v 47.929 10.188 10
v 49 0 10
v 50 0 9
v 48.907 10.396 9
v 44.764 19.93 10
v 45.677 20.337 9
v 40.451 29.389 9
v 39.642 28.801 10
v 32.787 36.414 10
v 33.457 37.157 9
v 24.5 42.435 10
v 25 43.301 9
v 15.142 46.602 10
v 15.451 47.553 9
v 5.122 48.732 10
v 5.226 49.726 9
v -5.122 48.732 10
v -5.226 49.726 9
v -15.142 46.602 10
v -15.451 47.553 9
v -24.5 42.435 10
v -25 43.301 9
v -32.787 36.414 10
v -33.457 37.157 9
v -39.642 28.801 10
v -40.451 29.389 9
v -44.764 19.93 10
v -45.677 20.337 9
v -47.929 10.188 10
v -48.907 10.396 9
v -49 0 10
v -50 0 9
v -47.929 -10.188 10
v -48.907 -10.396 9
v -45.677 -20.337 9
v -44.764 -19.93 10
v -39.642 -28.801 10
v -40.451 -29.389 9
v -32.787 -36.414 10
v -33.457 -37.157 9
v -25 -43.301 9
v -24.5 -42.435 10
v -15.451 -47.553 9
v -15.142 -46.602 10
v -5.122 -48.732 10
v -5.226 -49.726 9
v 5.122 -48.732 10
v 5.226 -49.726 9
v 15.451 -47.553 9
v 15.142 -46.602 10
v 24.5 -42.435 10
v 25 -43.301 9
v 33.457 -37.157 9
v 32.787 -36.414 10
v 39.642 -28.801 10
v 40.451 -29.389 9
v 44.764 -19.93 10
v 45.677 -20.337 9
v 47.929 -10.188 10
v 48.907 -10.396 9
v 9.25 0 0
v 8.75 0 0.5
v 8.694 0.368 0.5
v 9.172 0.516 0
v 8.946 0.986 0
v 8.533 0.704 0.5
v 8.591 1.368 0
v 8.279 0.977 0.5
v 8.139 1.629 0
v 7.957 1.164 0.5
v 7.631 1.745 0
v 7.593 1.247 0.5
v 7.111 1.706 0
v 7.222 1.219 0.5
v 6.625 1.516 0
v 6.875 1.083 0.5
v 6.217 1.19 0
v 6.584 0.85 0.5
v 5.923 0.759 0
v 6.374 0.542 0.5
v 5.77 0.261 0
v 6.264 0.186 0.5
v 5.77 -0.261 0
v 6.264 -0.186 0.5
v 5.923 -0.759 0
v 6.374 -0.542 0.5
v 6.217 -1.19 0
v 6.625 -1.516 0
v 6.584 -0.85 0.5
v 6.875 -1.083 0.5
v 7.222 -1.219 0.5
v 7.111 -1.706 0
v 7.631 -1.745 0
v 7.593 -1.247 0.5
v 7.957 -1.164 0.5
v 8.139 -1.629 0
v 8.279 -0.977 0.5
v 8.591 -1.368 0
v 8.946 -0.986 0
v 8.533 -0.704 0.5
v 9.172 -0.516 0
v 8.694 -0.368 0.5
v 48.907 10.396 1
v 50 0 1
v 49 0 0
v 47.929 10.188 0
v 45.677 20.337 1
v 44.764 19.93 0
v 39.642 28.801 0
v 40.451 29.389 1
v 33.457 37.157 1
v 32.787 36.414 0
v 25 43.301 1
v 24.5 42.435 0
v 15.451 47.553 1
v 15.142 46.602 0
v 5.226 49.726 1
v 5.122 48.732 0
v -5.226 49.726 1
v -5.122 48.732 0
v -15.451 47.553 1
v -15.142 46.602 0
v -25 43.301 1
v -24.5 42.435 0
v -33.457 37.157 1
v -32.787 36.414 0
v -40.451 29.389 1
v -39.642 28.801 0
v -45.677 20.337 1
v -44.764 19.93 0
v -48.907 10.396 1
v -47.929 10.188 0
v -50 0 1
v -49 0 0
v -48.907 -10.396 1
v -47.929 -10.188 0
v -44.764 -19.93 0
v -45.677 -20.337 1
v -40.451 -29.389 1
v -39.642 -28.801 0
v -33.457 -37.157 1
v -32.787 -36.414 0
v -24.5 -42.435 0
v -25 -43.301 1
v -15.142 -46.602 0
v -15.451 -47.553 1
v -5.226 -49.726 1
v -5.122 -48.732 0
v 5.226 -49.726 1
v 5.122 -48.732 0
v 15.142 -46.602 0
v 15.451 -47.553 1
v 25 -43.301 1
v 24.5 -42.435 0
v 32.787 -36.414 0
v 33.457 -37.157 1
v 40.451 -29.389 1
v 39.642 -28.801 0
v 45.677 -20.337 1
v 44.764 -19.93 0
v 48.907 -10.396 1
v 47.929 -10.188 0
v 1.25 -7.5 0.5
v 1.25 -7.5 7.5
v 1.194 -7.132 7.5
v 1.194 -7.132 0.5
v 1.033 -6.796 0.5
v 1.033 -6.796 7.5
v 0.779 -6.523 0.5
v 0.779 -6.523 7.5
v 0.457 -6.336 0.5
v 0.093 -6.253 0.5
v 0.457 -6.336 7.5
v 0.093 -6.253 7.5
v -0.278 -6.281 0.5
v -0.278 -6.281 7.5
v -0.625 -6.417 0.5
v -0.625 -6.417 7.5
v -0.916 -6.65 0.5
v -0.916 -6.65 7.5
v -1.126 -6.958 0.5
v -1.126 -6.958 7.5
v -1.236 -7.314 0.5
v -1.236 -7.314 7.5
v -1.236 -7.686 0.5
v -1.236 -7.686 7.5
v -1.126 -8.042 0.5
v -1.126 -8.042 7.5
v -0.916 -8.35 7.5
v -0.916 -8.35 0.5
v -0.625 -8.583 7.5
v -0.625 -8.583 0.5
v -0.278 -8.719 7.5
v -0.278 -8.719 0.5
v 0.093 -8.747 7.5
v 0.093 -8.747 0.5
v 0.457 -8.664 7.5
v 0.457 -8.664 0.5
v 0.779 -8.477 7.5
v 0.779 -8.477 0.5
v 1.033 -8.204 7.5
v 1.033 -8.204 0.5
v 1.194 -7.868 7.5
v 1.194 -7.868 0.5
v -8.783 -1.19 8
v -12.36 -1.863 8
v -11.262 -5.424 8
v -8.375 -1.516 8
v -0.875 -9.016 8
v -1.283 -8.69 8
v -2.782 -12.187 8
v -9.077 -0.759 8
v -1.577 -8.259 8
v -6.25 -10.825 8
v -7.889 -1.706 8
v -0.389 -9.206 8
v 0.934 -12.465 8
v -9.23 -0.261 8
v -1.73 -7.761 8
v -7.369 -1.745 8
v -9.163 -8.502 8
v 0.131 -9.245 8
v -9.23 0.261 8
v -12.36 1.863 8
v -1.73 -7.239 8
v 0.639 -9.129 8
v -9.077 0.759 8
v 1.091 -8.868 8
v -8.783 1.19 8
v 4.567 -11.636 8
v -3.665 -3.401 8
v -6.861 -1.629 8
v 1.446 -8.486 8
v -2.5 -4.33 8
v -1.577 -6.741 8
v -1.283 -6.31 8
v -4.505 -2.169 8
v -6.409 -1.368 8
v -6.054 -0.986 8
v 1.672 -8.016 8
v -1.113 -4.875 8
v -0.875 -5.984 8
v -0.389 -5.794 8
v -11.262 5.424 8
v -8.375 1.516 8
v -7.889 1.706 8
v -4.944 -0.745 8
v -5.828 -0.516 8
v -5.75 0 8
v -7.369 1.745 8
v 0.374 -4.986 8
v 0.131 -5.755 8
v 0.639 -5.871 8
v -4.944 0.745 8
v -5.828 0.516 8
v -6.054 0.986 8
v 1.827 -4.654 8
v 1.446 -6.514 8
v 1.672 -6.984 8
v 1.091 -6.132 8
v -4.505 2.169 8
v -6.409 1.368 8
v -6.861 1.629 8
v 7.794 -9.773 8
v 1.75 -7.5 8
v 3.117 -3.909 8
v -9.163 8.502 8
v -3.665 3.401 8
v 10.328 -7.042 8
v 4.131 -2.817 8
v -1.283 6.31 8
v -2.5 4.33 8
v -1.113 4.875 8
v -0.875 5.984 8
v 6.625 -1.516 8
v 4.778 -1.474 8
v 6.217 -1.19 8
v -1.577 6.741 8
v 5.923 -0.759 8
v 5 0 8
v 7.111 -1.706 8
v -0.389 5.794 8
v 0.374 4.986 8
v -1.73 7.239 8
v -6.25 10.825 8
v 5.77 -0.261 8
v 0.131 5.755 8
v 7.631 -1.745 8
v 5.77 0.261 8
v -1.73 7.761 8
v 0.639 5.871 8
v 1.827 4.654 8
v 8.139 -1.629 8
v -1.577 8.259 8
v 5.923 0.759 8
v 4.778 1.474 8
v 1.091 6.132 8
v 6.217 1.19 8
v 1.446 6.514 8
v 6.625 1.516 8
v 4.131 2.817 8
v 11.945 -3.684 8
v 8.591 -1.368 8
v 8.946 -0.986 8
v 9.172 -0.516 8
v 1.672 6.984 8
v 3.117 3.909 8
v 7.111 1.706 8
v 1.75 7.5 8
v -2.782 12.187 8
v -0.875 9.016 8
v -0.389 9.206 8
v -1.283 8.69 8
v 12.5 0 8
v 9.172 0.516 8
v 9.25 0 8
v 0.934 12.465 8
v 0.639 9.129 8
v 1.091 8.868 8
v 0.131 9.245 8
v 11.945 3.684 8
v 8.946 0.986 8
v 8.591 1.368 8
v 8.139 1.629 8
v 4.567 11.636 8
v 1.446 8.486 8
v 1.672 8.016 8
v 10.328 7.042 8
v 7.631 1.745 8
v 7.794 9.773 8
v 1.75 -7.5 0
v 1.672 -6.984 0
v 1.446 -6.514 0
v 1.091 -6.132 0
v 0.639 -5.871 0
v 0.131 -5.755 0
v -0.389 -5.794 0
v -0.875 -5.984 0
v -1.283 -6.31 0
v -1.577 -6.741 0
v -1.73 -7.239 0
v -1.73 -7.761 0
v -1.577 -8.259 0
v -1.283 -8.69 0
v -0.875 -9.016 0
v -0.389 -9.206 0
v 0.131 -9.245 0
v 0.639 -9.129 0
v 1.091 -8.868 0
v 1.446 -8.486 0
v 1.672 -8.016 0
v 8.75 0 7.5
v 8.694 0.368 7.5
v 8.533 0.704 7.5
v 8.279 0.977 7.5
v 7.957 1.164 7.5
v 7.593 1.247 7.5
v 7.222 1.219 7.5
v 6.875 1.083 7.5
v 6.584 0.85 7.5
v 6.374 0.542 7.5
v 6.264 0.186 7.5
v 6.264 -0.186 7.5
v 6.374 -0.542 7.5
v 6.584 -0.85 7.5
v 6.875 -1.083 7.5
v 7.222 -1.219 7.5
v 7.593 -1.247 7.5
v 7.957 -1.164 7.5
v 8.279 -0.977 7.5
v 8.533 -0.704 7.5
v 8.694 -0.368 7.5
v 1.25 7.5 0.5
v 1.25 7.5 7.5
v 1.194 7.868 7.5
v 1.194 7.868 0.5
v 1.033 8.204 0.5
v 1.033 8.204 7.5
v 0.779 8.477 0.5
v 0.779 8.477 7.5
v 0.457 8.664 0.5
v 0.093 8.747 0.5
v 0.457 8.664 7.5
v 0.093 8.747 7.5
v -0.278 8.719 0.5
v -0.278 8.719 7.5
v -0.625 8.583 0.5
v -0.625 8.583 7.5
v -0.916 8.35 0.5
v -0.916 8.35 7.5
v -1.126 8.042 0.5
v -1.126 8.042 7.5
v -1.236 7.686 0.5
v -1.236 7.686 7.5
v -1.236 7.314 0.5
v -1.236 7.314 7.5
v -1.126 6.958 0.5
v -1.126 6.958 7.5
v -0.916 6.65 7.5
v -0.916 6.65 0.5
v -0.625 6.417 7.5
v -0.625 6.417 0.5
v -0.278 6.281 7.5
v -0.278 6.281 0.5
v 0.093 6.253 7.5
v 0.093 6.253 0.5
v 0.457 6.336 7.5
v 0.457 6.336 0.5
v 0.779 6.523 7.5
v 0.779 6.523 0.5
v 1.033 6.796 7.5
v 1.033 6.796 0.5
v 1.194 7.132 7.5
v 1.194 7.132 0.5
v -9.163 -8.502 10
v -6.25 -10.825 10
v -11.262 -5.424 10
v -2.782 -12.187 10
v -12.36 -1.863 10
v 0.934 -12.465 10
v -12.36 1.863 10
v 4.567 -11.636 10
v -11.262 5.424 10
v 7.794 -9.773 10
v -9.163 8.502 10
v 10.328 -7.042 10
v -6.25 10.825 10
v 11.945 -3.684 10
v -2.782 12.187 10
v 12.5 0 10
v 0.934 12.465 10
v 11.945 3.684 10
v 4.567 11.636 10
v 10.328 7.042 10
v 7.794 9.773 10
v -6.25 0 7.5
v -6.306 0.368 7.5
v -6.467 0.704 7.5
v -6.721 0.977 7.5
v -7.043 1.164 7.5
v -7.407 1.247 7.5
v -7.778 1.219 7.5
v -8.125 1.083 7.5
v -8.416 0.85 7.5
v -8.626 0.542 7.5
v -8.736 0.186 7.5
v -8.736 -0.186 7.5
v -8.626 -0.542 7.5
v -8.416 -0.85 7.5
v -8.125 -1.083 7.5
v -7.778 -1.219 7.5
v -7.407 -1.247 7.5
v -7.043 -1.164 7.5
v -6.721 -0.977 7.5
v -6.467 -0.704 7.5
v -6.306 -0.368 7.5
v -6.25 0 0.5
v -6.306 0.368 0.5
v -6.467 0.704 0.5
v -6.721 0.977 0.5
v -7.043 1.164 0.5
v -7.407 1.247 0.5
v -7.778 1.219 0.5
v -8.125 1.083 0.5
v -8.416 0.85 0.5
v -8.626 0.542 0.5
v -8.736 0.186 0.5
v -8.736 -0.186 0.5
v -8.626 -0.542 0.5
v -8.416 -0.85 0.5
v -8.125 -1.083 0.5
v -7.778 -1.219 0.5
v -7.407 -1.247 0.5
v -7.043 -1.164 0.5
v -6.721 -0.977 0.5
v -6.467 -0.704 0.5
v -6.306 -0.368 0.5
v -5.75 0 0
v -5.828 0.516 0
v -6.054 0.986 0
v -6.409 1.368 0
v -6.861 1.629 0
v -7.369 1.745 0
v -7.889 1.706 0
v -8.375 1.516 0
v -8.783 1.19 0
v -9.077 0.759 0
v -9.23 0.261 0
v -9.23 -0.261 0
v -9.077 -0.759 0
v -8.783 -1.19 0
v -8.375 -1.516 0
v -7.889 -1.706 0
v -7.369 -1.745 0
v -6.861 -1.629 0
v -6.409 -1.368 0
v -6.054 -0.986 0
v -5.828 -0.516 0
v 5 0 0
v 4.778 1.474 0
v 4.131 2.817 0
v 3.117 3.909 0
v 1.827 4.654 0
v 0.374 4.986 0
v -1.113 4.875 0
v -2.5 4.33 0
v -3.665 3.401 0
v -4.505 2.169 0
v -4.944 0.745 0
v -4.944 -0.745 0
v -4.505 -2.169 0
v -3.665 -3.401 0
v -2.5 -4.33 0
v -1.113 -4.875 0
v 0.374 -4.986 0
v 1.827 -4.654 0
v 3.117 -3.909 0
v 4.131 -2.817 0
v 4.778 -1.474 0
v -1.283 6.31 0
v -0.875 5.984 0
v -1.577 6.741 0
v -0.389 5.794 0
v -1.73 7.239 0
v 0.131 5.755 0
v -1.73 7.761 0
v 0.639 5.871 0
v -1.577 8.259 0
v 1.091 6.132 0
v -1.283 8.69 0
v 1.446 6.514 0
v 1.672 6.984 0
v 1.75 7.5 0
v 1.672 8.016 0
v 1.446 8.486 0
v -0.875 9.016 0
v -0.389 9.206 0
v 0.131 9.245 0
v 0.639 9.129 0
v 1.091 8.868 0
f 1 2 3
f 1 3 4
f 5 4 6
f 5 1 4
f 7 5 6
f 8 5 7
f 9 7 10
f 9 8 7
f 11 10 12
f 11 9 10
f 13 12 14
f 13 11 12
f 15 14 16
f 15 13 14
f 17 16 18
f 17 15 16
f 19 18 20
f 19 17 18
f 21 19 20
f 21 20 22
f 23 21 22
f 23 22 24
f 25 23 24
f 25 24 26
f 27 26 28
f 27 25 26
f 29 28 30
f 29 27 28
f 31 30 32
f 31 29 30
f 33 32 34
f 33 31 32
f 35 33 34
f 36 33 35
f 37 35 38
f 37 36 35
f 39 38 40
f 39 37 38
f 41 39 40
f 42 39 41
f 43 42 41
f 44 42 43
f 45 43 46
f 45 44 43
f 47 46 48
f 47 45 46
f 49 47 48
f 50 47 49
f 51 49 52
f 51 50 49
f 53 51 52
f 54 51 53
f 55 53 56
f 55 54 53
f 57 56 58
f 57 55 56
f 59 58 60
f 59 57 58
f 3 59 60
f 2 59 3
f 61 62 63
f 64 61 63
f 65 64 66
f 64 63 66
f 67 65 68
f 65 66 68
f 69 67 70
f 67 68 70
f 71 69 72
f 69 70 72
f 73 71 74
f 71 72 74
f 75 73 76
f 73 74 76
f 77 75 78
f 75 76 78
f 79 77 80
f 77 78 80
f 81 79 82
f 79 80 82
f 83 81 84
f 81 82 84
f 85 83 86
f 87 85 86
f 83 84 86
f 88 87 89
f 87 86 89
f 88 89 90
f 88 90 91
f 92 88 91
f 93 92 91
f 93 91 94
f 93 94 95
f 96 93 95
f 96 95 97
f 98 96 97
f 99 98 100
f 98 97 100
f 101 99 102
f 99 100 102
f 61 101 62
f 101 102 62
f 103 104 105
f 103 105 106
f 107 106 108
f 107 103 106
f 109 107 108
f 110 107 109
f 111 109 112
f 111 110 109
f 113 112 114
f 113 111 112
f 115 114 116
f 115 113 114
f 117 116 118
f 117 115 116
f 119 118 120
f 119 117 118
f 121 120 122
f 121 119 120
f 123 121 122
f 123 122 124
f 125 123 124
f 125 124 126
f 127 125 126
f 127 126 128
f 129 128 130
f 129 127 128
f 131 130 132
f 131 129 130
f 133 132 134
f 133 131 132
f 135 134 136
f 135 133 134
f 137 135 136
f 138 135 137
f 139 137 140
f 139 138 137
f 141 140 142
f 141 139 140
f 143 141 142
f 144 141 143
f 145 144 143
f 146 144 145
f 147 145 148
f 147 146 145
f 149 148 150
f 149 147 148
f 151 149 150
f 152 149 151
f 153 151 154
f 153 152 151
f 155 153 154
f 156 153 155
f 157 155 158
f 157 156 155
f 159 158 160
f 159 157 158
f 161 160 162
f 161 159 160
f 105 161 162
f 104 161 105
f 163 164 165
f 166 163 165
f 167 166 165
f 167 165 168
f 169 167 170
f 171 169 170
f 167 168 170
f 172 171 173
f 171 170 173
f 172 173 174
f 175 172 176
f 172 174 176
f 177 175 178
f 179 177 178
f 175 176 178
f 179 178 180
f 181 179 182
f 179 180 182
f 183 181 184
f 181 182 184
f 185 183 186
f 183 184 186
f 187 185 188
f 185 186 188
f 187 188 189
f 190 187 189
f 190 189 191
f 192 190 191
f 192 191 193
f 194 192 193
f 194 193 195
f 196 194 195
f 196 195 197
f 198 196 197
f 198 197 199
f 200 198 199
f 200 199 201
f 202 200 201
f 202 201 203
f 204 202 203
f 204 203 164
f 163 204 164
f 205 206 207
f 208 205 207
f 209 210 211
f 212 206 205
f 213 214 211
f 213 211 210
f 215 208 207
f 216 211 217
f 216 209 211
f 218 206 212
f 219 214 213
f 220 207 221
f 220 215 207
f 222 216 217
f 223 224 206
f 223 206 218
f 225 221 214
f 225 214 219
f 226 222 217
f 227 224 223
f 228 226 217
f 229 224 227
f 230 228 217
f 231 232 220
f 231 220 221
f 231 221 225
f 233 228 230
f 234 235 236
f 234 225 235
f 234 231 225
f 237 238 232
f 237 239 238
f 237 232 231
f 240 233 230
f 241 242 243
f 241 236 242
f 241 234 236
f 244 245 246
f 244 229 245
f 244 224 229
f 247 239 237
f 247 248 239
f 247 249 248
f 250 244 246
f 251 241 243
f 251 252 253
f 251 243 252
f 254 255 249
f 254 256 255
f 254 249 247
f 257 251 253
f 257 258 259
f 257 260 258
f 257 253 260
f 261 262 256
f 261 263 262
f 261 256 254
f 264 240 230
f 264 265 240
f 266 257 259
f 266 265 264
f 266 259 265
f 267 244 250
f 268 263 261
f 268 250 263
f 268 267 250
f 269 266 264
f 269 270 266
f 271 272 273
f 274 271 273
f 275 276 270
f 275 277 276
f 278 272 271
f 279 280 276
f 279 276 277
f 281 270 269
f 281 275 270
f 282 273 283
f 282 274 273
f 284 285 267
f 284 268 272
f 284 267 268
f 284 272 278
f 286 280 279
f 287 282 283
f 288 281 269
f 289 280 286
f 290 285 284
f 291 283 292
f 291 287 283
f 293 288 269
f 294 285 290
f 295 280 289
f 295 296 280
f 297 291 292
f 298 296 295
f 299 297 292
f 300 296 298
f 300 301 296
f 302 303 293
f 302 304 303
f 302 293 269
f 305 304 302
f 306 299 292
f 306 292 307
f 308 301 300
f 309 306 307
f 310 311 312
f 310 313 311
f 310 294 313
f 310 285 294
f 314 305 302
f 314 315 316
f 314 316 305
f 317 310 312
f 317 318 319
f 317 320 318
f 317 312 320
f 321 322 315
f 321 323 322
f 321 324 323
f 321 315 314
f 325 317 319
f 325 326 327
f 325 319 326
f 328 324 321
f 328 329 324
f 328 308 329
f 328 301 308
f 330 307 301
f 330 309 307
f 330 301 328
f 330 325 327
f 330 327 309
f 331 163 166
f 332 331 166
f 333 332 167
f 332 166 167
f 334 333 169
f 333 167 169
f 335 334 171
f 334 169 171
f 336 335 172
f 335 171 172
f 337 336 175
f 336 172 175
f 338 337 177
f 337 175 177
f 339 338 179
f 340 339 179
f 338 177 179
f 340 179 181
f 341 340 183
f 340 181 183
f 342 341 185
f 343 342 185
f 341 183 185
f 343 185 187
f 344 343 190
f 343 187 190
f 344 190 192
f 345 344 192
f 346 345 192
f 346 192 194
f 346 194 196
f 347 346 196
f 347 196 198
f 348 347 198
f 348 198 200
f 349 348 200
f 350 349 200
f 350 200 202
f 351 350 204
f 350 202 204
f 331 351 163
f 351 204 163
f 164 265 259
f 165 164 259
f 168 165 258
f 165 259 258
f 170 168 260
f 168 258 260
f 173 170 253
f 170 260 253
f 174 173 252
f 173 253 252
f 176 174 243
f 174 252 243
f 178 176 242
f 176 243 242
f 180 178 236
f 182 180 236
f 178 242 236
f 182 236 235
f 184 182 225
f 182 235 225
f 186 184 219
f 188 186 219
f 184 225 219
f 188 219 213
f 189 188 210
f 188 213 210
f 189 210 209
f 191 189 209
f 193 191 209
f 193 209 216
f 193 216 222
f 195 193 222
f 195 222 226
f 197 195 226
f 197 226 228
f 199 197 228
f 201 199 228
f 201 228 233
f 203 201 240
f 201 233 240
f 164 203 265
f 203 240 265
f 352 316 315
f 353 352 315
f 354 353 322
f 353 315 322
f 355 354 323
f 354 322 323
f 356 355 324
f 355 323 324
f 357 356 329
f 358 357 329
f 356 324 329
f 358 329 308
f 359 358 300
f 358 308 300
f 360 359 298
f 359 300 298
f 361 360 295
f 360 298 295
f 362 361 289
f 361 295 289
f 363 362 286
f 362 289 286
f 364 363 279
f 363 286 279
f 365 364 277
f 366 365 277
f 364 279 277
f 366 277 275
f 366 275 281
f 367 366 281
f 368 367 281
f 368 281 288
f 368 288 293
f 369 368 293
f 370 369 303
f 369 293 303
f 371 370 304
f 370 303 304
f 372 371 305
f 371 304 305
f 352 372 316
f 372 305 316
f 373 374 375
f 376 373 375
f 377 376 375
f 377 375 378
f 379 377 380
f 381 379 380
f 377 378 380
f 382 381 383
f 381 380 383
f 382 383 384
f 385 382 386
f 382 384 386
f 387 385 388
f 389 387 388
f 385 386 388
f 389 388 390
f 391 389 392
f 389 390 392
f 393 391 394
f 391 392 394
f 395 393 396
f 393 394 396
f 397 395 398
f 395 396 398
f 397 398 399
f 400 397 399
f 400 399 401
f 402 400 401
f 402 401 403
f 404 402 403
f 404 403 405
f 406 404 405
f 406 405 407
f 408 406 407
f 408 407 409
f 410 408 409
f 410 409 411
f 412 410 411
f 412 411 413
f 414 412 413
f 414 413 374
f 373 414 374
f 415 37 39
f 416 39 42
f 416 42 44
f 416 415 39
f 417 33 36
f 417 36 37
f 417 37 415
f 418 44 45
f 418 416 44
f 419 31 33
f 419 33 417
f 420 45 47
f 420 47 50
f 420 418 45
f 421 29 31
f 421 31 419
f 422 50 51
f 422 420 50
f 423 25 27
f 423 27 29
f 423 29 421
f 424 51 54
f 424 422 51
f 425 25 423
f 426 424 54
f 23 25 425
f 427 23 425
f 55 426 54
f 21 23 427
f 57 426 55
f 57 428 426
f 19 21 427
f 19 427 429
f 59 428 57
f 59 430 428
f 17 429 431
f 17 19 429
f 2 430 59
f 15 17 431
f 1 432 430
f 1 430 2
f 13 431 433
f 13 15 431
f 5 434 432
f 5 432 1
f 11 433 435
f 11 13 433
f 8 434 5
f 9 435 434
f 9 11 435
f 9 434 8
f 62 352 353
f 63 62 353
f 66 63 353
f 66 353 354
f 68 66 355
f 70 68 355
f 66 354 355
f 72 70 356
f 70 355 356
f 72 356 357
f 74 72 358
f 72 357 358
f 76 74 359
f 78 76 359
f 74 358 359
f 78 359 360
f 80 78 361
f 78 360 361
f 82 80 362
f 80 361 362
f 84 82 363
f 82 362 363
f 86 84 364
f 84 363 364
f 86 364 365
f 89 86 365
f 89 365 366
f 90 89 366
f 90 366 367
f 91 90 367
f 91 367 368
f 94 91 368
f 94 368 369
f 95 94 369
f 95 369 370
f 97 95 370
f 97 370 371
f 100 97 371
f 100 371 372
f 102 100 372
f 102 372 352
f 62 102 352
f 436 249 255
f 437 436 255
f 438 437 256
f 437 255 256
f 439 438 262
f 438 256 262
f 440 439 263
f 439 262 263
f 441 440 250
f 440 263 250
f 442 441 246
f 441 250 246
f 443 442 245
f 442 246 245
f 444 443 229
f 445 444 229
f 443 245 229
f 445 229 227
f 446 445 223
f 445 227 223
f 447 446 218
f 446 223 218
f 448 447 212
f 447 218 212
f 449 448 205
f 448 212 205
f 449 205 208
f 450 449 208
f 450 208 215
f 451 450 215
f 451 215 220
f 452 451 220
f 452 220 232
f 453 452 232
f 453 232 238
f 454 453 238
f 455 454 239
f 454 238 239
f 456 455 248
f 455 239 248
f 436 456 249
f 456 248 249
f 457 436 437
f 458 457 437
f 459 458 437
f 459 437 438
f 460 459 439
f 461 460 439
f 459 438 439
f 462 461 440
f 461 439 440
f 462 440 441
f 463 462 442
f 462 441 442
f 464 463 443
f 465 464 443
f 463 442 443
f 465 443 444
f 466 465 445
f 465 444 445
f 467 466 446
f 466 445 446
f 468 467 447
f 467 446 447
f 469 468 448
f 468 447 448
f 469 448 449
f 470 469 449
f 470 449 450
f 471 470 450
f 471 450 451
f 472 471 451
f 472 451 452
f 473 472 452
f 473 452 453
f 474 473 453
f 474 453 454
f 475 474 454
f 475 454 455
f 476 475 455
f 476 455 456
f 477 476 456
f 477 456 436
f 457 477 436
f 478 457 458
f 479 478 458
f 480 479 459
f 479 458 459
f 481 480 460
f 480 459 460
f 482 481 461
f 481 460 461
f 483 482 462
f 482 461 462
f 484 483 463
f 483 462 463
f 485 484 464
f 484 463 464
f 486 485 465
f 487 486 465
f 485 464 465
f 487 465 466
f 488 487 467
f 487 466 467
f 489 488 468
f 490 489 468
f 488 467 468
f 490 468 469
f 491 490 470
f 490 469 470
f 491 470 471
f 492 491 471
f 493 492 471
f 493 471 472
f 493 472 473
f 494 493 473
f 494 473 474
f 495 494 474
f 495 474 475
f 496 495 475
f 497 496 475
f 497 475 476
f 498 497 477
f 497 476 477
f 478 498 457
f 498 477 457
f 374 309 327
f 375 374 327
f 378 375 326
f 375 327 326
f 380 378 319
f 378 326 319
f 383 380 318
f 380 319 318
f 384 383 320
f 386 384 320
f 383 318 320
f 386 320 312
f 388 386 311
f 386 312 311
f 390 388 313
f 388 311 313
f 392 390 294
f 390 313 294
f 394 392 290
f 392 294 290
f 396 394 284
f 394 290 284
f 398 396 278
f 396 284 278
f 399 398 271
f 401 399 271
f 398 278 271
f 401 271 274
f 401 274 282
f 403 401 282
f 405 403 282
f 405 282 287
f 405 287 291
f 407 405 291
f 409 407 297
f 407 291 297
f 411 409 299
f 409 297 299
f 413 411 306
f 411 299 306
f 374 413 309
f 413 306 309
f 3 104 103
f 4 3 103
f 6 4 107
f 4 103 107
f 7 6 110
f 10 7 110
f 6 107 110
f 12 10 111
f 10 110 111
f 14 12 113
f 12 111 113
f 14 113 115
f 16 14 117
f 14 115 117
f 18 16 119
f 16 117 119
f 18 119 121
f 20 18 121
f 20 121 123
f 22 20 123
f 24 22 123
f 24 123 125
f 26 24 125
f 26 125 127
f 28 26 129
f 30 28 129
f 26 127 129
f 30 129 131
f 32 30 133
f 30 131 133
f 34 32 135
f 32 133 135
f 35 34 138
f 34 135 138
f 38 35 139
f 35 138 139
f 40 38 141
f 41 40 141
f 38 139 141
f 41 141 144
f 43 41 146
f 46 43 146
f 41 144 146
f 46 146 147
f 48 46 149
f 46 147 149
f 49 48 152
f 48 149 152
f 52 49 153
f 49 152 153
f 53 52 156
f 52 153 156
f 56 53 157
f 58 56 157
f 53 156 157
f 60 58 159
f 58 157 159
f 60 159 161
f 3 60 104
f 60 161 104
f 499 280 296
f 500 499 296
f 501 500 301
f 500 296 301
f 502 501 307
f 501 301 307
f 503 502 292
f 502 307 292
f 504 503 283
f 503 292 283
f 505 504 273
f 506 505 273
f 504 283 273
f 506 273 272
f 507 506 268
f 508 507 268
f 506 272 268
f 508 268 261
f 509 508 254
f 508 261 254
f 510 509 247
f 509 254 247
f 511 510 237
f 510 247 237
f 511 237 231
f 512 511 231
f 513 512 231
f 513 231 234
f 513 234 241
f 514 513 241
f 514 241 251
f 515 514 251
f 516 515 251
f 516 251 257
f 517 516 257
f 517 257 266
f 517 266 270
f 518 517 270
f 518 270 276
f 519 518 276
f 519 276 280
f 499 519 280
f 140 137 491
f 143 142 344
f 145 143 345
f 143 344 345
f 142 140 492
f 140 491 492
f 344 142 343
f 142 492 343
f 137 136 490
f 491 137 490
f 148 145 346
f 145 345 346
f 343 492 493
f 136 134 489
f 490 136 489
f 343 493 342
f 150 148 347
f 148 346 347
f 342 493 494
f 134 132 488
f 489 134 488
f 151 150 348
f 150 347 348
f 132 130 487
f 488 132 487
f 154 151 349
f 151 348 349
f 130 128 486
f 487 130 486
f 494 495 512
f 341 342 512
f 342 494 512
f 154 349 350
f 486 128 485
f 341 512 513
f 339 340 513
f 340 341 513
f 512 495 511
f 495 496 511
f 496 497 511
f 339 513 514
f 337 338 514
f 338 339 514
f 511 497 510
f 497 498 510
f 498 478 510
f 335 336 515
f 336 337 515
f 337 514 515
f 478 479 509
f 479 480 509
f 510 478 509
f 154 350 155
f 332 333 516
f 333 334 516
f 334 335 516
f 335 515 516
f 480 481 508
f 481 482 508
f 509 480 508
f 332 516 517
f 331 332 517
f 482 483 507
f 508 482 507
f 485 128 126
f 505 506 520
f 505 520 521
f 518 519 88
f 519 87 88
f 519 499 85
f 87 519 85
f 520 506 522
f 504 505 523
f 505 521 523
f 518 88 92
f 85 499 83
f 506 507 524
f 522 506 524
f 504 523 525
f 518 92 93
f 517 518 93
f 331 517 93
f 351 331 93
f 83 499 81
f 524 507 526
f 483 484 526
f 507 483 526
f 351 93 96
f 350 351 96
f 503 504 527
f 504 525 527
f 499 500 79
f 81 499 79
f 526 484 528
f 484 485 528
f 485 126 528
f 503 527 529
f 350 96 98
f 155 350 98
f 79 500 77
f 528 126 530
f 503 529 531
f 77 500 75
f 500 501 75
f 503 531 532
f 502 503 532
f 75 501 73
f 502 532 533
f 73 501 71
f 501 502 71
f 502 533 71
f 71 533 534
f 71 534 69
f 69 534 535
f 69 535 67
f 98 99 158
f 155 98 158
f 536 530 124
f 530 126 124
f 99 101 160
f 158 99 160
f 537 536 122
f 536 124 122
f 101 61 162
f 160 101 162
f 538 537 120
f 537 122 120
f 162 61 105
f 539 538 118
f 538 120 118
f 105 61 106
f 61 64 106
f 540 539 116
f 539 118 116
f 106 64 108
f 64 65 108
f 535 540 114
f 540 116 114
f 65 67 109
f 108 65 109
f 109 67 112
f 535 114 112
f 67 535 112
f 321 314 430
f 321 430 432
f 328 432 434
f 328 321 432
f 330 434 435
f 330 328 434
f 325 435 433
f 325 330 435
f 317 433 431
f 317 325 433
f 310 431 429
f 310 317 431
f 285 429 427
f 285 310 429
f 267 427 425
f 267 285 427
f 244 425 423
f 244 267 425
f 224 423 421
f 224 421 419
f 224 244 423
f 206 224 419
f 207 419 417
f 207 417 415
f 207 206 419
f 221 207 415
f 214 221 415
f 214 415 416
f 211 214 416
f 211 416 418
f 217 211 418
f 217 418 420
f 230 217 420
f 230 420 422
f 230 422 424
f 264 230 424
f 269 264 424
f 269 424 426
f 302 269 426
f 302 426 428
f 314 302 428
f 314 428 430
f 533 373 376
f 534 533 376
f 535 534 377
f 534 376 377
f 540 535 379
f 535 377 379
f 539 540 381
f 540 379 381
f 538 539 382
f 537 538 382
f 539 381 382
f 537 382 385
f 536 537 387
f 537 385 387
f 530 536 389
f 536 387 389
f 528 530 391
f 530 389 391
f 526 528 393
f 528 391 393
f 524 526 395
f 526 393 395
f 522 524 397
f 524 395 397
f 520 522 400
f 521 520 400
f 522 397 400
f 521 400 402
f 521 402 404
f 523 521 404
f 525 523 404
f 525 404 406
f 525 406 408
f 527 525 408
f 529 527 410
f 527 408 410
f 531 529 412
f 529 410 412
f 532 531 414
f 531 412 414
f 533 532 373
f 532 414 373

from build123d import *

# Parameters (mm, degrees)
F0_R     = 50
F0_R_2   = 12.5
F1_DEPTH = 10
F2_DEPTH = 8
F3_R     = 5
F3_R_2   = 1.25
F4_DEPTH = 25
F5_SIZE  = 1
F6_SIZE  = 0.5


with BuildPart() as f1:
    # F0 (on Top) → F1 (new body)
    with BuildSketch(Plane.XY):
        Circle(F0_R)
        Circle(F0_R_2, mode=Mode.SUBTRACT)
    extrude(amount=F1_DEPTH)

    # F0 (on Top) → F2 (join)
    with BuildSketch(Plane.XY):
        Circle(F0_R_2)
    extrude(amount=F2_DEPTH)

    # F3 (on face) → F4 (cut)
    with BuildSketch(Plane.XY.offset(8)):
        Circle(F3_R)
        with Locations((-7.5, 0)):
            Circle(F3_R_2)
        with Locations((0, 7.5)):
            Circle(F3_R_2)
        with Locations((7.5, 0)):
            Circle(F3_R_2)
        with Locations((0, -7.5)):
            Circle(F3_R_2)
    extrude(amount=-F4_DEPTH, mode=Mode.SUBTRACT)

    # F5
    f5_edges = [f1.edges().sort_by_distance(p)[0] for p in [
        (-50, 0, 0),
        (-50, 0, 10),
    ]]
    chamfer(f5_edges, length=F5_SIZE)

    # F6
    f6_edges = [f1.edges().sort_by_distance(p)[0] for p in [
        (-8.75, 0, 0),
        (-1.25, -7.5, 0),
        (6.25, 0, 0),
        (-1.25, 7.5, 0),
        (6.25, 0, 8),
        (-1.25, -7.5, 8),
        (-1.25, 7.5, 8),
        (-8.75, 0, 8),
    ]]
    chamfer(f6_edges, length=F6_SIZE)


solid = f1.part
